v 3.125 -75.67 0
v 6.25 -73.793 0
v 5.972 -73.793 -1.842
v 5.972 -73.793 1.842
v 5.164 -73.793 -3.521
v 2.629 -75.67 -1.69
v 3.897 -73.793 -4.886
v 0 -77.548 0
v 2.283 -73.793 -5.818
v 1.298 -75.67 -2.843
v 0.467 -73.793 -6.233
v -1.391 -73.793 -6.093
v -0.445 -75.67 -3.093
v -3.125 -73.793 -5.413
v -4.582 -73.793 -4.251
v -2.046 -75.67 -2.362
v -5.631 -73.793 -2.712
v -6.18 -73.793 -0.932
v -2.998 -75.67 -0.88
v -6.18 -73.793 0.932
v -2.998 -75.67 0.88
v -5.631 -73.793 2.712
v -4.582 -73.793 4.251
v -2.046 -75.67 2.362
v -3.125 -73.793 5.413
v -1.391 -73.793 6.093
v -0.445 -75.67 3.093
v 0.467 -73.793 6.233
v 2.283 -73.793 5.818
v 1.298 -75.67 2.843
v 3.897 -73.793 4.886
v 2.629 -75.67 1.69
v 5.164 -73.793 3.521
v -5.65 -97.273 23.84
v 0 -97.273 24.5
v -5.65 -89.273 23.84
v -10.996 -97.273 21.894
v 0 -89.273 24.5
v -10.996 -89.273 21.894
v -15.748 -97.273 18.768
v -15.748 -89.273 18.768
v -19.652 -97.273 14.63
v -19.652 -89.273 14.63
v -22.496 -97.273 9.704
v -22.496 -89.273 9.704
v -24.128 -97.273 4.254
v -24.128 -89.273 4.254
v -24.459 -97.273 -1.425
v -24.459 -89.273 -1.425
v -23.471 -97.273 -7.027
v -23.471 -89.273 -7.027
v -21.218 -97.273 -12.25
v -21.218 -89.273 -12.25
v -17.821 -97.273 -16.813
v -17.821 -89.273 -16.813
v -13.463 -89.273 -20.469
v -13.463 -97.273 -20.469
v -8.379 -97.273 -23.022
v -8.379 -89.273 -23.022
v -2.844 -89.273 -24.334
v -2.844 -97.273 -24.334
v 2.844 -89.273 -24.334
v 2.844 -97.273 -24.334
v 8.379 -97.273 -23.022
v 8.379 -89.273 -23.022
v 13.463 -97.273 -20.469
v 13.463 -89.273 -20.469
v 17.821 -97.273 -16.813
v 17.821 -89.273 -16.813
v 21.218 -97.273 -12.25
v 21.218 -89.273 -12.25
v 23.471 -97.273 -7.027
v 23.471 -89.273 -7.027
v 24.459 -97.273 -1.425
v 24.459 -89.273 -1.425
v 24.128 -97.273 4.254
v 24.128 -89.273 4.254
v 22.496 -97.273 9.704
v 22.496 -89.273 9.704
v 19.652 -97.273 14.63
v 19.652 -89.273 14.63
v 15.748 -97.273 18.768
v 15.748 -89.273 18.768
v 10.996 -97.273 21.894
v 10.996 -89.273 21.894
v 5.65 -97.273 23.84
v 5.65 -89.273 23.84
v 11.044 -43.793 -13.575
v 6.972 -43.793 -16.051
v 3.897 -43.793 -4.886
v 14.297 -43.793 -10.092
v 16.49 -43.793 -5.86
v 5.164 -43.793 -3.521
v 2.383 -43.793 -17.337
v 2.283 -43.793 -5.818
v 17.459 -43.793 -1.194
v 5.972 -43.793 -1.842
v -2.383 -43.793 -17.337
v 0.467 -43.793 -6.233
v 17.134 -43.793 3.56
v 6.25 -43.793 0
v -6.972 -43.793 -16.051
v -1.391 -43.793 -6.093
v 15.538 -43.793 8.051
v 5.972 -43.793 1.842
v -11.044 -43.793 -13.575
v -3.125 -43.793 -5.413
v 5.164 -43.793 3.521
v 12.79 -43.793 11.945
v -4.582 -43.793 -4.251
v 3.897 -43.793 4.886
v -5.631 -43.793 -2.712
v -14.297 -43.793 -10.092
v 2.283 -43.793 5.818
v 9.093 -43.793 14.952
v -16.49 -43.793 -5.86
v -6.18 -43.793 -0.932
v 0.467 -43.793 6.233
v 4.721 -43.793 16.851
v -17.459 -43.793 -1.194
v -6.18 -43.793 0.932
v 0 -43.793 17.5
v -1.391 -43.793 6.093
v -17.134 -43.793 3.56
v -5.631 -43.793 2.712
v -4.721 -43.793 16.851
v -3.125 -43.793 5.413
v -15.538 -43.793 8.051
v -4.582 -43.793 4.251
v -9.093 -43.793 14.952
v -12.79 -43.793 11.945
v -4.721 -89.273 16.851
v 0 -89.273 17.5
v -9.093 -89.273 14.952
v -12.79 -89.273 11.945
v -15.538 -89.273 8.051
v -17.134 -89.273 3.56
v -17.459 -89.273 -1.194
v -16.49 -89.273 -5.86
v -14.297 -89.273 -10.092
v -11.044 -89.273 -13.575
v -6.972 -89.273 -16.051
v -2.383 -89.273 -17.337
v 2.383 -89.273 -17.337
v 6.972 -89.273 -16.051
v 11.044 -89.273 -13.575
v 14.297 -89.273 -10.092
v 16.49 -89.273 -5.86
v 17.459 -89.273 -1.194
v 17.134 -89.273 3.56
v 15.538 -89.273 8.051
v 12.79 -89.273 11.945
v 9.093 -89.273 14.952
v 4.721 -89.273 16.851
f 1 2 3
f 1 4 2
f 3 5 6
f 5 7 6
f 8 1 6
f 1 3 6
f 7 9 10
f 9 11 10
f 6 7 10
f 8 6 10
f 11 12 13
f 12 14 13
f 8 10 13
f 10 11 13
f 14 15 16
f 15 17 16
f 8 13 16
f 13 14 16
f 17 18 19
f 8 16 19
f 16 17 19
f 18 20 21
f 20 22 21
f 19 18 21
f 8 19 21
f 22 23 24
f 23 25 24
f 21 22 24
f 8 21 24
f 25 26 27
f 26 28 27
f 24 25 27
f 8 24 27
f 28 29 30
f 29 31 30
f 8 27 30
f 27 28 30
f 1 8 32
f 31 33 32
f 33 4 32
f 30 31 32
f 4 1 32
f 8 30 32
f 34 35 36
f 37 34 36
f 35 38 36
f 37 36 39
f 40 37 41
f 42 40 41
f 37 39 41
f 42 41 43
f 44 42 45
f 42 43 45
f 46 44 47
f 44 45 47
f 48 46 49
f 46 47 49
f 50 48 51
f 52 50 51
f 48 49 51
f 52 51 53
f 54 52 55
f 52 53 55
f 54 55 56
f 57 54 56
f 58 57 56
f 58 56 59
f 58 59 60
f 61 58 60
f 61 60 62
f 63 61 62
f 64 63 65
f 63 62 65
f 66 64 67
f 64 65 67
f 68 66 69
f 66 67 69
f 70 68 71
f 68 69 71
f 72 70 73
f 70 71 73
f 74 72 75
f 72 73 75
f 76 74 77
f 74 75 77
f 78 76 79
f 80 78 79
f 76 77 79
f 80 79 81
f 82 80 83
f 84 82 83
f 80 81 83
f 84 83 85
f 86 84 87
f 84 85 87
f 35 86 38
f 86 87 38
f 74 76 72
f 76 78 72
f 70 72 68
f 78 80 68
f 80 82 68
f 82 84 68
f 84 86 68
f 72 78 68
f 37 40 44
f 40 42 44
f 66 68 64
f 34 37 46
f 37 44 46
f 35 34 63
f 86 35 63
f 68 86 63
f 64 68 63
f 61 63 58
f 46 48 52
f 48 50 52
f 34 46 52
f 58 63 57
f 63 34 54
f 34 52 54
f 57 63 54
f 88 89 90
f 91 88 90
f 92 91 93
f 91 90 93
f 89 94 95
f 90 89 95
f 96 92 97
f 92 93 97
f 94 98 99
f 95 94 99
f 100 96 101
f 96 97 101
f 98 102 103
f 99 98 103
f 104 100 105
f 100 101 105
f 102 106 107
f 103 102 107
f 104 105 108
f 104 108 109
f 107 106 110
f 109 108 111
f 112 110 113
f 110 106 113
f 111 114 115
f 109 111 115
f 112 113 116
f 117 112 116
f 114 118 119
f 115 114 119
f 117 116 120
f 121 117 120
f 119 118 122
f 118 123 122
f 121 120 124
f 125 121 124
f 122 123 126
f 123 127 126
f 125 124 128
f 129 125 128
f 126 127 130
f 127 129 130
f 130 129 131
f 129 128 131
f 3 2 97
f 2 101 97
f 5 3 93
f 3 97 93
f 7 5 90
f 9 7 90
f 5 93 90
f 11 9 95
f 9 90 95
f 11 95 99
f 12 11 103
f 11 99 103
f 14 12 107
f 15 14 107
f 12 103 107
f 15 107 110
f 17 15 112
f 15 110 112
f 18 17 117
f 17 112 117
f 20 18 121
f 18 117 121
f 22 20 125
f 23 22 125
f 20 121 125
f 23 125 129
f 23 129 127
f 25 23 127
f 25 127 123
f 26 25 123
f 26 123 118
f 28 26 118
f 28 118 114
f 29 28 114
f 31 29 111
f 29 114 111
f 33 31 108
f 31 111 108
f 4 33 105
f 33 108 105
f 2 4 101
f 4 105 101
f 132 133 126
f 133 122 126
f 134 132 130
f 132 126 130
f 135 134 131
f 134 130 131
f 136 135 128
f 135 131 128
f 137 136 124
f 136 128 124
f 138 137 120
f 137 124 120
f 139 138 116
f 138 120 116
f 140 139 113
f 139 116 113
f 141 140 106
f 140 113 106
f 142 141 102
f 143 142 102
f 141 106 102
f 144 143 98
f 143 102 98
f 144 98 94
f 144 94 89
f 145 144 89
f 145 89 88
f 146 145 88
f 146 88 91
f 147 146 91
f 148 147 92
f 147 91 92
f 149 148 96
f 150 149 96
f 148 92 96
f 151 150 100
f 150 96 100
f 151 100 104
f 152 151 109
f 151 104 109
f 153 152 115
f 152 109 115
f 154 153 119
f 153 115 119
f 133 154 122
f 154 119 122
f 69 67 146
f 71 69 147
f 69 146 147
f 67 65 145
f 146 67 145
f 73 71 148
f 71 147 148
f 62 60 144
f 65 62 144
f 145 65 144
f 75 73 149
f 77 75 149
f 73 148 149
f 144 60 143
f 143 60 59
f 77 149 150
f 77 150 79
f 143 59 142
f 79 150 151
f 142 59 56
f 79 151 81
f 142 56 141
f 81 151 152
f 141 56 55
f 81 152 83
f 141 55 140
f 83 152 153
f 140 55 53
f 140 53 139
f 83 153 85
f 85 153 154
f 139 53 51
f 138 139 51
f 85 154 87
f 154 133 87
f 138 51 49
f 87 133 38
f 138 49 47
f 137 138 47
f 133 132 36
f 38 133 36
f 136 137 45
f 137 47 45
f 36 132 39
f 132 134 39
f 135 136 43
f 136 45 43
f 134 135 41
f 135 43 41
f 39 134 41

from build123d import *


# Read off the part's stored shape, not the designer's step: PerçageAvancé1
with BuildPart() as part:
    # Esquisse1 → Révolution1 (revolve)
    with BuildSketch(Plane.XY, mode=Mode.PRIVATE) as r_volution1_sk:
        Polygon((0, -43.792727273), (0, -97.272727273), (-24.5, -97.272727273), (-24.5, -89.272727273), (-17.5, -89.272727273), (-17.5, -43.792727273), align=None)
    revolve(r_volution1_sk.sketch.rotate(Axis((0, 115.909090909, 0), (0, -1, 0)), 270), axis=Axis((0, 115.909090909, 0), (0, -1, 0)))

    # PerçageAvancé1 outline → PerçageAvancé1 (revolve, cut)
    with BuildSketch(Plane.XY):
        Polygon((0, -77.548106142), (6.25, -73.792727273), (6.25, -43.792727273), (0, -43.792727273), align=None)
    revolve(axis=Axis((0, 0, 0), (0, 1, 0)), mode=Mode.SUBTRACT)


solid = part.part
